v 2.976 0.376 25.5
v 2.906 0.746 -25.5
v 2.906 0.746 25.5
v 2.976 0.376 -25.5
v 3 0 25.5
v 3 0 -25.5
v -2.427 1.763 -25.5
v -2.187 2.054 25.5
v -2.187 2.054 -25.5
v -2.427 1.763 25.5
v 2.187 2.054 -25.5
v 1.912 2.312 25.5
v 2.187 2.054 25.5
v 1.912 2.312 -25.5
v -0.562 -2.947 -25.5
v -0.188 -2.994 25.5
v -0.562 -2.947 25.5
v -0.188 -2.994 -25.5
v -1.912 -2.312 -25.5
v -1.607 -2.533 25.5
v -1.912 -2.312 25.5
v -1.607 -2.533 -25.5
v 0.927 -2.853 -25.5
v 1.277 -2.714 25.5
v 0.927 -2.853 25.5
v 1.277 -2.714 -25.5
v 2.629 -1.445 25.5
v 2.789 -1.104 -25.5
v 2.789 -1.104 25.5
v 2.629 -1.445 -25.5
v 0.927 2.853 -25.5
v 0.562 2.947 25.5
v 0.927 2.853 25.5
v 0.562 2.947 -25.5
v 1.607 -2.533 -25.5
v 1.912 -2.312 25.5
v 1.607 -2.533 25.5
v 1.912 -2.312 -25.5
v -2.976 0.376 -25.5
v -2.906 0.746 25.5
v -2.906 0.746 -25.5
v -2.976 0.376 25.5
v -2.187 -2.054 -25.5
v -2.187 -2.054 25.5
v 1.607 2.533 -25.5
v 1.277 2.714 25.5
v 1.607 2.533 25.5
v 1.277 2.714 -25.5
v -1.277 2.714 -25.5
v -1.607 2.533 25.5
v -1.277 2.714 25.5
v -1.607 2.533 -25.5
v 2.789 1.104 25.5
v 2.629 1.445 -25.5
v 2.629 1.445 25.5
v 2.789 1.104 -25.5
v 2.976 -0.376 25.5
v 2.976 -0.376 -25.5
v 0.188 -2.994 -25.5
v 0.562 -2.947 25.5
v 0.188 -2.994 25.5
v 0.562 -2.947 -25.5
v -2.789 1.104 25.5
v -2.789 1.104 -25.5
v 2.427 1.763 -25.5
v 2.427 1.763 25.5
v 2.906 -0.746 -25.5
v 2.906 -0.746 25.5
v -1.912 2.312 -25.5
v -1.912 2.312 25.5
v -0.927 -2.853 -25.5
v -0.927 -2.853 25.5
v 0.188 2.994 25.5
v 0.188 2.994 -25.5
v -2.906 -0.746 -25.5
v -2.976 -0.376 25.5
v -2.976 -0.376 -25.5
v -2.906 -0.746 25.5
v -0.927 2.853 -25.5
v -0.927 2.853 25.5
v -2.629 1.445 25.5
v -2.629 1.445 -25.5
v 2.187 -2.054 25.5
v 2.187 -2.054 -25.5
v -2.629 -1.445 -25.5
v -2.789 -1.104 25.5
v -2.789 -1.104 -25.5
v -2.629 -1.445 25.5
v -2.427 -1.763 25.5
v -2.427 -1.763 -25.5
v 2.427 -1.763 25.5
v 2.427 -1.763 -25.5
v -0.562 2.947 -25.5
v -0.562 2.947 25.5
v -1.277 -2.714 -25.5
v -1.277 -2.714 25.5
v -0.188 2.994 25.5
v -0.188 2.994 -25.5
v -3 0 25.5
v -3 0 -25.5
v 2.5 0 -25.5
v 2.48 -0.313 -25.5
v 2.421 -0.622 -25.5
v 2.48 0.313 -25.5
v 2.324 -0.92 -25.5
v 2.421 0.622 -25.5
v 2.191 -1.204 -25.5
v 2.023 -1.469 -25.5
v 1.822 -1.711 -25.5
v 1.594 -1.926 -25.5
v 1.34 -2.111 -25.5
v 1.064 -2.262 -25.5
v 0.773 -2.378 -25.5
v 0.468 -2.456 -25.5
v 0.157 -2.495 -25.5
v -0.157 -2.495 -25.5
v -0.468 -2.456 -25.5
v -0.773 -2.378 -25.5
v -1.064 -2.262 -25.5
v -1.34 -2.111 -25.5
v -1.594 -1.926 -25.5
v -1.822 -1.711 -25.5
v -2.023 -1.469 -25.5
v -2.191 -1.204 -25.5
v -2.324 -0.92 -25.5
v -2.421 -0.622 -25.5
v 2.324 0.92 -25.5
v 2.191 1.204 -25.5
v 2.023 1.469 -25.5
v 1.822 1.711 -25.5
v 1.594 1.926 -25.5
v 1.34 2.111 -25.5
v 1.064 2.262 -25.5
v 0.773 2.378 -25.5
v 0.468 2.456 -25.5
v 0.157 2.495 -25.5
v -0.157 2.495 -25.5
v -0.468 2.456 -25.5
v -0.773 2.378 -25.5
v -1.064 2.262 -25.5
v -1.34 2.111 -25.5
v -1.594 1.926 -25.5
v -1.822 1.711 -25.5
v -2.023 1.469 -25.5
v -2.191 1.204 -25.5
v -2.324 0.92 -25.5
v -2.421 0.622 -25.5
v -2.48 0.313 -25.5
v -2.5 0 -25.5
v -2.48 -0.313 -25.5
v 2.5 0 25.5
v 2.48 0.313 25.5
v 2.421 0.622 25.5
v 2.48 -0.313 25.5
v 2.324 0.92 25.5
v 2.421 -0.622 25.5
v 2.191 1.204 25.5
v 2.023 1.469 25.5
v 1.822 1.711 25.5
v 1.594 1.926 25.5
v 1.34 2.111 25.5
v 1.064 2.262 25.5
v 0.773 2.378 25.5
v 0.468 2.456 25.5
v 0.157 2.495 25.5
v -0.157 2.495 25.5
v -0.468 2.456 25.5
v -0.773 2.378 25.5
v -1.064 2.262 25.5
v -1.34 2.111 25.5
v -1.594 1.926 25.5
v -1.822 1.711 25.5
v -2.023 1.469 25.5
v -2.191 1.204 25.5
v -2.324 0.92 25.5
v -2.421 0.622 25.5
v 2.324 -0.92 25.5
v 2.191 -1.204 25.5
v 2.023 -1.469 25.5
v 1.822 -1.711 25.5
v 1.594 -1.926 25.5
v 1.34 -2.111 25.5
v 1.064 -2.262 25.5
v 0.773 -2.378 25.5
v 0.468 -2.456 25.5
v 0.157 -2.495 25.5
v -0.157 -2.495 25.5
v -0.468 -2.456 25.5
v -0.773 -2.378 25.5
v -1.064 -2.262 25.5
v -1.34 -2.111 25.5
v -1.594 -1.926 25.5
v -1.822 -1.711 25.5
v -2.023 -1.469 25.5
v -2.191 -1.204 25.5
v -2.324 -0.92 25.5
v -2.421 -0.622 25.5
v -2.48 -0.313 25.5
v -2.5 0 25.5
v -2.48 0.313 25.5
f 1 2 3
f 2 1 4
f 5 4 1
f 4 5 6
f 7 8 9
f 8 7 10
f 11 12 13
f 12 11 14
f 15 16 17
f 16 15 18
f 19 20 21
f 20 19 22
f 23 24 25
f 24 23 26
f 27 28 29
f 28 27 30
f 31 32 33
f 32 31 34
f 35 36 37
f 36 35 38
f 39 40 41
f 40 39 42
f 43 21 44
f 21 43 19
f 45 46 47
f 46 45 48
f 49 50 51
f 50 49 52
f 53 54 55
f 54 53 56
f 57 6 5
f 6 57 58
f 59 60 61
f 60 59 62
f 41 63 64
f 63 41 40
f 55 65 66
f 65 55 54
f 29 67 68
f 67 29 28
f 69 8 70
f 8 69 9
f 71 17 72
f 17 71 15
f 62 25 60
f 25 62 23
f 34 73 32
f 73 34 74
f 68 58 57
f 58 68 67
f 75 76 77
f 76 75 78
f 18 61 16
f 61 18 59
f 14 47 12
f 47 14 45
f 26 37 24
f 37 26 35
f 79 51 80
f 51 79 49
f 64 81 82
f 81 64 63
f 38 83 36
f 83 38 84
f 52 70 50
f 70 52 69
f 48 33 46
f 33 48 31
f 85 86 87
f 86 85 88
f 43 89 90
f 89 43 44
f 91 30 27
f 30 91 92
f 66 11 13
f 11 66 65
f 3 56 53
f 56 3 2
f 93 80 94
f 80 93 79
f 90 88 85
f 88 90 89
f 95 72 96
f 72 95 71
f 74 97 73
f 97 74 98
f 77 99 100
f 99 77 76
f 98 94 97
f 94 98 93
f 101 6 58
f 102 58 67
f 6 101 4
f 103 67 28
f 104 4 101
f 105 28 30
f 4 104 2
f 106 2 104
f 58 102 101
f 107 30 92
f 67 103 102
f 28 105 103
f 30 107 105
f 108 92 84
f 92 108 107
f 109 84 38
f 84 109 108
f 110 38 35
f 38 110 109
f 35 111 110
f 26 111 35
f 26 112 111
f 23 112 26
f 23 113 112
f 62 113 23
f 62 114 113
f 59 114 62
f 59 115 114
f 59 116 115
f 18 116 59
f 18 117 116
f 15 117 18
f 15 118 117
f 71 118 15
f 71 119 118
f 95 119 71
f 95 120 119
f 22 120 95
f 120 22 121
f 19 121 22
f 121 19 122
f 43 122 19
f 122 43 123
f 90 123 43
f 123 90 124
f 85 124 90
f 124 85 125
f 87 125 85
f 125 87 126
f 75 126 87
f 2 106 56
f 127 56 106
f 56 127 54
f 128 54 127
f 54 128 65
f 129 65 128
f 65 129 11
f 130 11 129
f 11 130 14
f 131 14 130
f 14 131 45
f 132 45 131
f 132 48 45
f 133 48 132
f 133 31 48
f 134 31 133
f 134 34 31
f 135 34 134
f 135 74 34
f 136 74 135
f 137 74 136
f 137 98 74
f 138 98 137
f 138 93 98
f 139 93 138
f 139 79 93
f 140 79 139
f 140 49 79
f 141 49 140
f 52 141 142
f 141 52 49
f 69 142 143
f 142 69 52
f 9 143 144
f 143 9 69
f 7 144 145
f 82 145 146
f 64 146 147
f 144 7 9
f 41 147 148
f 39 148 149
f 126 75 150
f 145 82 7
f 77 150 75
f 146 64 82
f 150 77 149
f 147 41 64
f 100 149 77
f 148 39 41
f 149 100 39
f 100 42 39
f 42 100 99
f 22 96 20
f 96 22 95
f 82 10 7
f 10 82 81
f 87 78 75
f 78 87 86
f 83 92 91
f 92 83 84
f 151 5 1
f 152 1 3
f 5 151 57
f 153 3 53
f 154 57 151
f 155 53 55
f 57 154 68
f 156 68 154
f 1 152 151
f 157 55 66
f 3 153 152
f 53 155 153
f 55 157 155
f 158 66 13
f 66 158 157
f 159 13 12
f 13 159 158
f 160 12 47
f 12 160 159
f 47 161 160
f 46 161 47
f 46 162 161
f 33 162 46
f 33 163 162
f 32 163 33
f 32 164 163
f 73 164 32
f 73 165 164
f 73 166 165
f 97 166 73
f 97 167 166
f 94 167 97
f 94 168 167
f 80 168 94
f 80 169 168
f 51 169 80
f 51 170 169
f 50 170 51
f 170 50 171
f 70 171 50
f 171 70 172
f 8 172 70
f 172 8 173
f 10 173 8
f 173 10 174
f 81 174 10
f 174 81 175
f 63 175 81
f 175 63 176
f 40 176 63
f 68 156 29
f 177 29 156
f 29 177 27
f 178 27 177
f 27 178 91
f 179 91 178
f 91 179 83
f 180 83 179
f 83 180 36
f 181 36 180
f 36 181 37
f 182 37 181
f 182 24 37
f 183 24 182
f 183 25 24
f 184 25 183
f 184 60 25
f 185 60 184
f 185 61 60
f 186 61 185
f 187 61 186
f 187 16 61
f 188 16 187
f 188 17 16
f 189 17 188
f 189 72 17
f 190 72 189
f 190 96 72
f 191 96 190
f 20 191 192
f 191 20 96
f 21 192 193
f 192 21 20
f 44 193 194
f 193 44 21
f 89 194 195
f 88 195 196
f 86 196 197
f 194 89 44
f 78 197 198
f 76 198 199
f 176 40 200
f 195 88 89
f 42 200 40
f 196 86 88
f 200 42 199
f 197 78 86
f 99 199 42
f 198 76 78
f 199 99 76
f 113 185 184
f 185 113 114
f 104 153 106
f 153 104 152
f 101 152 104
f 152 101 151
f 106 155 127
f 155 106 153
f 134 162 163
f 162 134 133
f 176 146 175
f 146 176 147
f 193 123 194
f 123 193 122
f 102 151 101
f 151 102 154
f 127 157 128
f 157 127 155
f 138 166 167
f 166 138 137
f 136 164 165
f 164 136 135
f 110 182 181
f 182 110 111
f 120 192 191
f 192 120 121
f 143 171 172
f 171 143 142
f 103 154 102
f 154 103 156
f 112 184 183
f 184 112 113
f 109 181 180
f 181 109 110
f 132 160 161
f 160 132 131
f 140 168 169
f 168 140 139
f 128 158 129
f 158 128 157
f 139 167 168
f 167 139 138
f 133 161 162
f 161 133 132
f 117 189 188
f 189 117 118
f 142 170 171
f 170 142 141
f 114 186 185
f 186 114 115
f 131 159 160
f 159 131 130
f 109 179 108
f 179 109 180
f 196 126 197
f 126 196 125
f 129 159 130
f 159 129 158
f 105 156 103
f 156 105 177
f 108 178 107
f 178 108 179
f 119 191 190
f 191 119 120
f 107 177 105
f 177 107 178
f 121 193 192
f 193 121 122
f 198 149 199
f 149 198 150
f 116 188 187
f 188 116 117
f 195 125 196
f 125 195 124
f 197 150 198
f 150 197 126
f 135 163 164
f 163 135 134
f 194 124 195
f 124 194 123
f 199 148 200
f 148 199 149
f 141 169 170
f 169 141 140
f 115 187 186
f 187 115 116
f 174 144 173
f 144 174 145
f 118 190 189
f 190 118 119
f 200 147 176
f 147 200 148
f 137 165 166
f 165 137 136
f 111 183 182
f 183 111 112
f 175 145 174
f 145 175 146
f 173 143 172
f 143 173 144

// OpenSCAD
$fn = 50;


difference() {
	union() {
		translate(v = [0, 0, -25.5000000000]) {
			cylinder(h = 51, r = 3.0000000000);
		}
	}
	union() {
		translate(v = [0, 0, -100.0000000000]) {
			cylinder(h = 200, r = 2.5000000000);
		}
	}
}
